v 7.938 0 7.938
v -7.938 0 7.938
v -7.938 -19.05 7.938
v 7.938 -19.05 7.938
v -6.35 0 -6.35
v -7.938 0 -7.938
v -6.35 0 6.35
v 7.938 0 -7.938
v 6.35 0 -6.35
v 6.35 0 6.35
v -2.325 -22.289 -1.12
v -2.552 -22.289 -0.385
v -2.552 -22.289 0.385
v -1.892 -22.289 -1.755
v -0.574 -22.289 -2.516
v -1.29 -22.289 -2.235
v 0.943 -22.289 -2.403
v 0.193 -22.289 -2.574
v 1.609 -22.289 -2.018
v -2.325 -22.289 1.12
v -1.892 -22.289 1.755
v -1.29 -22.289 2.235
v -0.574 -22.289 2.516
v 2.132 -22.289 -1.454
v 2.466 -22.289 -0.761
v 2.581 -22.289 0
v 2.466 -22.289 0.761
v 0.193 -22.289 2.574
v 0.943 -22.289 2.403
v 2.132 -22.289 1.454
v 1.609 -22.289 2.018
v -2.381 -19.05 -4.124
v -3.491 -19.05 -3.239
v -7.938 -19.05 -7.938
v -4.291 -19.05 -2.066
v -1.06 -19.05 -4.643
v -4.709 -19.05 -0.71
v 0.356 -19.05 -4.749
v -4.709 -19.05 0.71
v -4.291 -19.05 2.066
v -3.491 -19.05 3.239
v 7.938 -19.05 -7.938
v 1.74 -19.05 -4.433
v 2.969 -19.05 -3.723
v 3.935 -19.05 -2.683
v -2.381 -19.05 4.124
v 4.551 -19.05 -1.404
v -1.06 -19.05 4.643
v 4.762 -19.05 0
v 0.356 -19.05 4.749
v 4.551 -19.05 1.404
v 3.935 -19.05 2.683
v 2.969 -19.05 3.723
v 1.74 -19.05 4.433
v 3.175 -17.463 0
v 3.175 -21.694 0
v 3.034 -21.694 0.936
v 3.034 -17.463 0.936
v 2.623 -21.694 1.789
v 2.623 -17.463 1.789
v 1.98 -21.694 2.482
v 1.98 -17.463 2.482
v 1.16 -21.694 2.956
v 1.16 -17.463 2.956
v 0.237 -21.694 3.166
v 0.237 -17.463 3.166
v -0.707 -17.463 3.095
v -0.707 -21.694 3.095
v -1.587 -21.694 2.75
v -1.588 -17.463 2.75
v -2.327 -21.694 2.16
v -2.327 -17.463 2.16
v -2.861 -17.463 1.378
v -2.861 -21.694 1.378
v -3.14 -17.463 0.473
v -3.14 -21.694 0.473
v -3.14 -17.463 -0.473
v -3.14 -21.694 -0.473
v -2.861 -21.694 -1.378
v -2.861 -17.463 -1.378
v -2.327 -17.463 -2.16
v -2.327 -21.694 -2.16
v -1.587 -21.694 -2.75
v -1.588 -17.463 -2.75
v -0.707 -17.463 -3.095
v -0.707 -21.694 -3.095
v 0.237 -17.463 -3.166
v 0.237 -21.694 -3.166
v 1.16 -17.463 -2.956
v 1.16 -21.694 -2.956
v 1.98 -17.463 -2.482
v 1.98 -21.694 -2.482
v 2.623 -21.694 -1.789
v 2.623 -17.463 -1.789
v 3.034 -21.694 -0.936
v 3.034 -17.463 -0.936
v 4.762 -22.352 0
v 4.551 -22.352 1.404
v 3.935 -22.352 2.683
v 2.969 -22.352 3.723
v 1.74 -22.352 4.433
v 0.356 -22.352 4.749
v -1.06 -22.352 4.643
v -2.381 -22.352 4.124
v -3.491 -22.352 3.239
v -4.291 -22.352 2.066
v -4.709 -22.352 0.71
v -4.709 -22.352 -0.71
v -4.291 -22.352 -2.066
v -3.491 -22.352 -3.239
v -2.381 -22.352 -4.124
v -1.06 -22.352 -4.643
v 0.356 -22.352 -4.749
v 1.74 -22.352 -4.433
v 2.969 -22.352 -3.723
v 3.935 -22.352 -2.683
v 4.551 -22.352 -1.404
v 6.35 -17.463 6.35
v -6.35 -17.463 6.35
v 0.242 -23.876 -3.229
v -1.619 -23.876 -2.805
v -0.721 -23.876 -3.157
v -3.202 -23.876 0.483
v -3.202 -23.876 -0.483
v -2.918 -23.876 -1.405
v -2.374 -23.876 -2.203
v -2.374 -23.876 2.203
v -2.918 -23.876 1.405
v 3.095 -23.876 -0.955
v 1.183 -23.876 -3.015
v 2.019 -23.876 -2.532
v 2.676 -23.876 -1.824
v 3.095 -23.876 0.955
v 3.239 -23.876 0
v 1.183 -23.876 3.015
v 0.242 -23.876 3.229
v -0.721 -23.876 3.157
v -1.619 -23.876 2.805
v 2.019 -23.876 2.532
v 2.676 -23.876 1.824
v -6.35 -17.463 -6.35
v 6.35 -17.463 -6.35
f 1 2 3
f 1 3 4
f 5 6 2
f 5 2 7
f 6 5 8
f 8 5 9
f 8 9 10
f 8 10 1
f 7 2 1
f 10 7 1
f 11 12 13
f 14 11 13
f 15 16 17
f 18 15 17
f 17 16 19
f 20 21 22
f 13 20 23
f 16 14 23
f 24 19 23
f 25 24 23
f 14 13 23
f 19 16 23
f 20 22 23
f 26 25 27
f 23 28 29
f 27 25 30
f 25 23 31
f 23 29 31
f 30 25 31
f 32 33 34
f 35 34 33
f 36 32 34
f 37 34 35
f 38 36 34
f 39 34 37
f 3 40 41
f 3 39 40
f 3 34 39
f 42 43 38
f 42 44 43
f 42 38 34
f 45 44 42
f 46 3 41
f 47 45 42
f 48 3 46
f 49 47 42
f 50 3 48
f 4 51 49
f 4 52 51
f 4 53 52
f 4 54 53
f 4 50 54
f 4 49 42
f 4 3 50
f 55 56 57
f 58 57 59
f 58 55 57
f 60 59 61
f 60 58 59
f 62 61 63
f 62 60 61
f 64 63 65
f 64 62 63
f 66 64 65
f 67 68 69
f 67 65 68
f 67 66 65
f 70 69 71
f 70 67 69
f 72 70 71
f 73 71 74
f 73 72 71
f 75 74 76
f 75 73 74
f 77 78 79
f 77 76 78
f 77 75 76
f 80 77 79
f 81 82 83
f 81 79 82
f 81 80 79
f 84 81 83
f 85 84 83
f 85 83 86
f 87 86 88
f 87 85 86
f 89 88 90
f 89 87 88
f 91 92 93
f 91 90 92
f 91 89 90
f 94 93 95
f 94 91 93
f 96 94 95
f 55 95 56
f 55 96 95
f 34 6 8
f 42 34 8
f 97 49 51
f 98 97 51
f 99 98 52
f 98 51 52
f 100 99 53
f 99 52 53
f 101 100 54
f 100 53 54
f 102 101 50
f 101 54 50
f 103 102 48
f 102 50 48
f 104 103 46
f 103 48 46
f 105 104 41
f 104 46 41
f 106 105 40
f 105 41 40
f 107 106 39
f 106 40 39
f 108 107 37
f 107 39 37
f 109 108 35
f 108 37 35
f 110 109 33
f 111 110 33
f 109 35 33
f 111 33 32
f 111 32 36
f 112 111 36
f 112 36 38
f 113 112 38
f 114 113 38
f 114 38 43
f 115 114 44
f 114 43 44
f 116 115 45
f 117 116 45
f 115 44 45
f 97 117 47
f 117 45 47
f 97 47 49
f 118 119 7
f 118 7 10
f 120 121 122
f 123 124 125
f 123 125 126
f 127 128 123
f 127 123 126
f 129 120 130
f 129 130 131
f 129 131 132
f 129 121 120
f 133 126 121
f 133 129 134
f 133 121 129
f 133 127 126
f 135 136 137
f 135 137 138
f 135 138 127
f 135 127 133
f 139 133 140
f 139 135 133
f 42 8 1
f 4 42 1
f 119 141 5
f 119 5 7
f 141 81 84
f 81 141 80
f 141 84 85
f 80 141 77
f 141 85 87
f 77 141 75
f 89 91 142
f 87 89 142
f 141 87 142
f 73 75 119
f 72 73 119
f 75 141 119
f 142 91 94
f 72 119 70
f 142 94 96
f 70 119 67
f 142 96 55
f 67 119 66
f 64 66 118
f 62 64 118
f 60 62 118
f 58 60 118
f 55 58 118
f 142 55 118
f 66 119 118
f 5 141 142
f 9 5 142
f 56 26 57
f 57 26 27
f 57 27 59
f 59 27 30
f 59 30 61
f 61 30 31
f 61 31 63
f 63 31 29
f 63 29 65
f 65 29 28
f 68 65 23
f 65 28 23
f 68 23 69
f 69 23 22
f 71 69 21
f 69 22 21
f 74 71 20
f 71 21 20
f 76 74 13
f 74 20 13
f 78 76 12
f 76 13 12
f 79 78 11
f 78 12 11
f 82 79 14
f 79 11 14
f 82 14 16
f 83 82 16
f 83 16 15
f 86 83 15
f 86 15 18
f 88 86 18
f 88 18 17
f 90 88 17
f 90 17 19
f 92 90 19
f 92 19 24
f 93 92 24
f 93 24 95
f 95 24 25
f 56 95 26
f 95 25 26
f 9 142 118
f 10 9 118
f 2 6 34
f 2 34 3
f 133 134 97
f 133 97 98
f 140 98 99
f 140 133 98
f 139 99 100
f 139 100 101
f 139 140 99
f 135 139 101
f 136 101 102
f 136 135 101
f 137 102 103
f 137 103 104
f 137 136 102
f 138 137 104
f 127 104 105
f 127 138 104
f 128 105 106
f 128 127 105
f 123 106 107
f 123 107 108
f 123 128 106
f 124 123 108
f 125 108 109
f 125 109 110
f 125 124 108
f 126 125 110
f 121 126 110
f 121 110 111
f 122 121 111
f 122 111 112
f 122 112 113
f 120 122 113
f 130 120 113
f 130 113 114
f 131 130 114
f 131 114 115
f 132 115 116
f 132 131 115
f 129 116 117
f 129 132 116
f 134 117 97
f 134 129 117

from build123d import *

# Parameters (mm, degrees)
F0_W     = 15.875
F0_H     = 15.875
F1_DEPTH = 19.05
F2_R     = 4.7625
F3_DEPTH = 4.826
F4_SIZE  = 1.524
F5_T     = -1.5875


with BuildPart() as f1:
    # F0 (on Front) → F1 (new body)
    with BuildSketch(Plane.XZ):
        Rectangle(F0_W, F0_H)
    extrude(amount=F1_DEPTH)

    # F2 (on face) → F3 (join)
    with BuildSketch(Plane.XZ.offset(19.05)):
        Circle(F2_R)
    extrude(amount=F3_DEPTH)

    # F4
    f4_edges = [f1.edges().sort_by_distance(p)[0] for p in [
        (-4.7625, -23.876, 0),
    ]]
    chamfer(f4_edges, length=F4_SIZE)

    # F5
    f5_openings = [f1.faces().sort_by_distance(p)[0] for p in [
        (0, 0, 0),
    ]]
    offset(amount=F5_T, openings=f5_openings, kind=Kind.INTERSECTION)


solid = f1.part
